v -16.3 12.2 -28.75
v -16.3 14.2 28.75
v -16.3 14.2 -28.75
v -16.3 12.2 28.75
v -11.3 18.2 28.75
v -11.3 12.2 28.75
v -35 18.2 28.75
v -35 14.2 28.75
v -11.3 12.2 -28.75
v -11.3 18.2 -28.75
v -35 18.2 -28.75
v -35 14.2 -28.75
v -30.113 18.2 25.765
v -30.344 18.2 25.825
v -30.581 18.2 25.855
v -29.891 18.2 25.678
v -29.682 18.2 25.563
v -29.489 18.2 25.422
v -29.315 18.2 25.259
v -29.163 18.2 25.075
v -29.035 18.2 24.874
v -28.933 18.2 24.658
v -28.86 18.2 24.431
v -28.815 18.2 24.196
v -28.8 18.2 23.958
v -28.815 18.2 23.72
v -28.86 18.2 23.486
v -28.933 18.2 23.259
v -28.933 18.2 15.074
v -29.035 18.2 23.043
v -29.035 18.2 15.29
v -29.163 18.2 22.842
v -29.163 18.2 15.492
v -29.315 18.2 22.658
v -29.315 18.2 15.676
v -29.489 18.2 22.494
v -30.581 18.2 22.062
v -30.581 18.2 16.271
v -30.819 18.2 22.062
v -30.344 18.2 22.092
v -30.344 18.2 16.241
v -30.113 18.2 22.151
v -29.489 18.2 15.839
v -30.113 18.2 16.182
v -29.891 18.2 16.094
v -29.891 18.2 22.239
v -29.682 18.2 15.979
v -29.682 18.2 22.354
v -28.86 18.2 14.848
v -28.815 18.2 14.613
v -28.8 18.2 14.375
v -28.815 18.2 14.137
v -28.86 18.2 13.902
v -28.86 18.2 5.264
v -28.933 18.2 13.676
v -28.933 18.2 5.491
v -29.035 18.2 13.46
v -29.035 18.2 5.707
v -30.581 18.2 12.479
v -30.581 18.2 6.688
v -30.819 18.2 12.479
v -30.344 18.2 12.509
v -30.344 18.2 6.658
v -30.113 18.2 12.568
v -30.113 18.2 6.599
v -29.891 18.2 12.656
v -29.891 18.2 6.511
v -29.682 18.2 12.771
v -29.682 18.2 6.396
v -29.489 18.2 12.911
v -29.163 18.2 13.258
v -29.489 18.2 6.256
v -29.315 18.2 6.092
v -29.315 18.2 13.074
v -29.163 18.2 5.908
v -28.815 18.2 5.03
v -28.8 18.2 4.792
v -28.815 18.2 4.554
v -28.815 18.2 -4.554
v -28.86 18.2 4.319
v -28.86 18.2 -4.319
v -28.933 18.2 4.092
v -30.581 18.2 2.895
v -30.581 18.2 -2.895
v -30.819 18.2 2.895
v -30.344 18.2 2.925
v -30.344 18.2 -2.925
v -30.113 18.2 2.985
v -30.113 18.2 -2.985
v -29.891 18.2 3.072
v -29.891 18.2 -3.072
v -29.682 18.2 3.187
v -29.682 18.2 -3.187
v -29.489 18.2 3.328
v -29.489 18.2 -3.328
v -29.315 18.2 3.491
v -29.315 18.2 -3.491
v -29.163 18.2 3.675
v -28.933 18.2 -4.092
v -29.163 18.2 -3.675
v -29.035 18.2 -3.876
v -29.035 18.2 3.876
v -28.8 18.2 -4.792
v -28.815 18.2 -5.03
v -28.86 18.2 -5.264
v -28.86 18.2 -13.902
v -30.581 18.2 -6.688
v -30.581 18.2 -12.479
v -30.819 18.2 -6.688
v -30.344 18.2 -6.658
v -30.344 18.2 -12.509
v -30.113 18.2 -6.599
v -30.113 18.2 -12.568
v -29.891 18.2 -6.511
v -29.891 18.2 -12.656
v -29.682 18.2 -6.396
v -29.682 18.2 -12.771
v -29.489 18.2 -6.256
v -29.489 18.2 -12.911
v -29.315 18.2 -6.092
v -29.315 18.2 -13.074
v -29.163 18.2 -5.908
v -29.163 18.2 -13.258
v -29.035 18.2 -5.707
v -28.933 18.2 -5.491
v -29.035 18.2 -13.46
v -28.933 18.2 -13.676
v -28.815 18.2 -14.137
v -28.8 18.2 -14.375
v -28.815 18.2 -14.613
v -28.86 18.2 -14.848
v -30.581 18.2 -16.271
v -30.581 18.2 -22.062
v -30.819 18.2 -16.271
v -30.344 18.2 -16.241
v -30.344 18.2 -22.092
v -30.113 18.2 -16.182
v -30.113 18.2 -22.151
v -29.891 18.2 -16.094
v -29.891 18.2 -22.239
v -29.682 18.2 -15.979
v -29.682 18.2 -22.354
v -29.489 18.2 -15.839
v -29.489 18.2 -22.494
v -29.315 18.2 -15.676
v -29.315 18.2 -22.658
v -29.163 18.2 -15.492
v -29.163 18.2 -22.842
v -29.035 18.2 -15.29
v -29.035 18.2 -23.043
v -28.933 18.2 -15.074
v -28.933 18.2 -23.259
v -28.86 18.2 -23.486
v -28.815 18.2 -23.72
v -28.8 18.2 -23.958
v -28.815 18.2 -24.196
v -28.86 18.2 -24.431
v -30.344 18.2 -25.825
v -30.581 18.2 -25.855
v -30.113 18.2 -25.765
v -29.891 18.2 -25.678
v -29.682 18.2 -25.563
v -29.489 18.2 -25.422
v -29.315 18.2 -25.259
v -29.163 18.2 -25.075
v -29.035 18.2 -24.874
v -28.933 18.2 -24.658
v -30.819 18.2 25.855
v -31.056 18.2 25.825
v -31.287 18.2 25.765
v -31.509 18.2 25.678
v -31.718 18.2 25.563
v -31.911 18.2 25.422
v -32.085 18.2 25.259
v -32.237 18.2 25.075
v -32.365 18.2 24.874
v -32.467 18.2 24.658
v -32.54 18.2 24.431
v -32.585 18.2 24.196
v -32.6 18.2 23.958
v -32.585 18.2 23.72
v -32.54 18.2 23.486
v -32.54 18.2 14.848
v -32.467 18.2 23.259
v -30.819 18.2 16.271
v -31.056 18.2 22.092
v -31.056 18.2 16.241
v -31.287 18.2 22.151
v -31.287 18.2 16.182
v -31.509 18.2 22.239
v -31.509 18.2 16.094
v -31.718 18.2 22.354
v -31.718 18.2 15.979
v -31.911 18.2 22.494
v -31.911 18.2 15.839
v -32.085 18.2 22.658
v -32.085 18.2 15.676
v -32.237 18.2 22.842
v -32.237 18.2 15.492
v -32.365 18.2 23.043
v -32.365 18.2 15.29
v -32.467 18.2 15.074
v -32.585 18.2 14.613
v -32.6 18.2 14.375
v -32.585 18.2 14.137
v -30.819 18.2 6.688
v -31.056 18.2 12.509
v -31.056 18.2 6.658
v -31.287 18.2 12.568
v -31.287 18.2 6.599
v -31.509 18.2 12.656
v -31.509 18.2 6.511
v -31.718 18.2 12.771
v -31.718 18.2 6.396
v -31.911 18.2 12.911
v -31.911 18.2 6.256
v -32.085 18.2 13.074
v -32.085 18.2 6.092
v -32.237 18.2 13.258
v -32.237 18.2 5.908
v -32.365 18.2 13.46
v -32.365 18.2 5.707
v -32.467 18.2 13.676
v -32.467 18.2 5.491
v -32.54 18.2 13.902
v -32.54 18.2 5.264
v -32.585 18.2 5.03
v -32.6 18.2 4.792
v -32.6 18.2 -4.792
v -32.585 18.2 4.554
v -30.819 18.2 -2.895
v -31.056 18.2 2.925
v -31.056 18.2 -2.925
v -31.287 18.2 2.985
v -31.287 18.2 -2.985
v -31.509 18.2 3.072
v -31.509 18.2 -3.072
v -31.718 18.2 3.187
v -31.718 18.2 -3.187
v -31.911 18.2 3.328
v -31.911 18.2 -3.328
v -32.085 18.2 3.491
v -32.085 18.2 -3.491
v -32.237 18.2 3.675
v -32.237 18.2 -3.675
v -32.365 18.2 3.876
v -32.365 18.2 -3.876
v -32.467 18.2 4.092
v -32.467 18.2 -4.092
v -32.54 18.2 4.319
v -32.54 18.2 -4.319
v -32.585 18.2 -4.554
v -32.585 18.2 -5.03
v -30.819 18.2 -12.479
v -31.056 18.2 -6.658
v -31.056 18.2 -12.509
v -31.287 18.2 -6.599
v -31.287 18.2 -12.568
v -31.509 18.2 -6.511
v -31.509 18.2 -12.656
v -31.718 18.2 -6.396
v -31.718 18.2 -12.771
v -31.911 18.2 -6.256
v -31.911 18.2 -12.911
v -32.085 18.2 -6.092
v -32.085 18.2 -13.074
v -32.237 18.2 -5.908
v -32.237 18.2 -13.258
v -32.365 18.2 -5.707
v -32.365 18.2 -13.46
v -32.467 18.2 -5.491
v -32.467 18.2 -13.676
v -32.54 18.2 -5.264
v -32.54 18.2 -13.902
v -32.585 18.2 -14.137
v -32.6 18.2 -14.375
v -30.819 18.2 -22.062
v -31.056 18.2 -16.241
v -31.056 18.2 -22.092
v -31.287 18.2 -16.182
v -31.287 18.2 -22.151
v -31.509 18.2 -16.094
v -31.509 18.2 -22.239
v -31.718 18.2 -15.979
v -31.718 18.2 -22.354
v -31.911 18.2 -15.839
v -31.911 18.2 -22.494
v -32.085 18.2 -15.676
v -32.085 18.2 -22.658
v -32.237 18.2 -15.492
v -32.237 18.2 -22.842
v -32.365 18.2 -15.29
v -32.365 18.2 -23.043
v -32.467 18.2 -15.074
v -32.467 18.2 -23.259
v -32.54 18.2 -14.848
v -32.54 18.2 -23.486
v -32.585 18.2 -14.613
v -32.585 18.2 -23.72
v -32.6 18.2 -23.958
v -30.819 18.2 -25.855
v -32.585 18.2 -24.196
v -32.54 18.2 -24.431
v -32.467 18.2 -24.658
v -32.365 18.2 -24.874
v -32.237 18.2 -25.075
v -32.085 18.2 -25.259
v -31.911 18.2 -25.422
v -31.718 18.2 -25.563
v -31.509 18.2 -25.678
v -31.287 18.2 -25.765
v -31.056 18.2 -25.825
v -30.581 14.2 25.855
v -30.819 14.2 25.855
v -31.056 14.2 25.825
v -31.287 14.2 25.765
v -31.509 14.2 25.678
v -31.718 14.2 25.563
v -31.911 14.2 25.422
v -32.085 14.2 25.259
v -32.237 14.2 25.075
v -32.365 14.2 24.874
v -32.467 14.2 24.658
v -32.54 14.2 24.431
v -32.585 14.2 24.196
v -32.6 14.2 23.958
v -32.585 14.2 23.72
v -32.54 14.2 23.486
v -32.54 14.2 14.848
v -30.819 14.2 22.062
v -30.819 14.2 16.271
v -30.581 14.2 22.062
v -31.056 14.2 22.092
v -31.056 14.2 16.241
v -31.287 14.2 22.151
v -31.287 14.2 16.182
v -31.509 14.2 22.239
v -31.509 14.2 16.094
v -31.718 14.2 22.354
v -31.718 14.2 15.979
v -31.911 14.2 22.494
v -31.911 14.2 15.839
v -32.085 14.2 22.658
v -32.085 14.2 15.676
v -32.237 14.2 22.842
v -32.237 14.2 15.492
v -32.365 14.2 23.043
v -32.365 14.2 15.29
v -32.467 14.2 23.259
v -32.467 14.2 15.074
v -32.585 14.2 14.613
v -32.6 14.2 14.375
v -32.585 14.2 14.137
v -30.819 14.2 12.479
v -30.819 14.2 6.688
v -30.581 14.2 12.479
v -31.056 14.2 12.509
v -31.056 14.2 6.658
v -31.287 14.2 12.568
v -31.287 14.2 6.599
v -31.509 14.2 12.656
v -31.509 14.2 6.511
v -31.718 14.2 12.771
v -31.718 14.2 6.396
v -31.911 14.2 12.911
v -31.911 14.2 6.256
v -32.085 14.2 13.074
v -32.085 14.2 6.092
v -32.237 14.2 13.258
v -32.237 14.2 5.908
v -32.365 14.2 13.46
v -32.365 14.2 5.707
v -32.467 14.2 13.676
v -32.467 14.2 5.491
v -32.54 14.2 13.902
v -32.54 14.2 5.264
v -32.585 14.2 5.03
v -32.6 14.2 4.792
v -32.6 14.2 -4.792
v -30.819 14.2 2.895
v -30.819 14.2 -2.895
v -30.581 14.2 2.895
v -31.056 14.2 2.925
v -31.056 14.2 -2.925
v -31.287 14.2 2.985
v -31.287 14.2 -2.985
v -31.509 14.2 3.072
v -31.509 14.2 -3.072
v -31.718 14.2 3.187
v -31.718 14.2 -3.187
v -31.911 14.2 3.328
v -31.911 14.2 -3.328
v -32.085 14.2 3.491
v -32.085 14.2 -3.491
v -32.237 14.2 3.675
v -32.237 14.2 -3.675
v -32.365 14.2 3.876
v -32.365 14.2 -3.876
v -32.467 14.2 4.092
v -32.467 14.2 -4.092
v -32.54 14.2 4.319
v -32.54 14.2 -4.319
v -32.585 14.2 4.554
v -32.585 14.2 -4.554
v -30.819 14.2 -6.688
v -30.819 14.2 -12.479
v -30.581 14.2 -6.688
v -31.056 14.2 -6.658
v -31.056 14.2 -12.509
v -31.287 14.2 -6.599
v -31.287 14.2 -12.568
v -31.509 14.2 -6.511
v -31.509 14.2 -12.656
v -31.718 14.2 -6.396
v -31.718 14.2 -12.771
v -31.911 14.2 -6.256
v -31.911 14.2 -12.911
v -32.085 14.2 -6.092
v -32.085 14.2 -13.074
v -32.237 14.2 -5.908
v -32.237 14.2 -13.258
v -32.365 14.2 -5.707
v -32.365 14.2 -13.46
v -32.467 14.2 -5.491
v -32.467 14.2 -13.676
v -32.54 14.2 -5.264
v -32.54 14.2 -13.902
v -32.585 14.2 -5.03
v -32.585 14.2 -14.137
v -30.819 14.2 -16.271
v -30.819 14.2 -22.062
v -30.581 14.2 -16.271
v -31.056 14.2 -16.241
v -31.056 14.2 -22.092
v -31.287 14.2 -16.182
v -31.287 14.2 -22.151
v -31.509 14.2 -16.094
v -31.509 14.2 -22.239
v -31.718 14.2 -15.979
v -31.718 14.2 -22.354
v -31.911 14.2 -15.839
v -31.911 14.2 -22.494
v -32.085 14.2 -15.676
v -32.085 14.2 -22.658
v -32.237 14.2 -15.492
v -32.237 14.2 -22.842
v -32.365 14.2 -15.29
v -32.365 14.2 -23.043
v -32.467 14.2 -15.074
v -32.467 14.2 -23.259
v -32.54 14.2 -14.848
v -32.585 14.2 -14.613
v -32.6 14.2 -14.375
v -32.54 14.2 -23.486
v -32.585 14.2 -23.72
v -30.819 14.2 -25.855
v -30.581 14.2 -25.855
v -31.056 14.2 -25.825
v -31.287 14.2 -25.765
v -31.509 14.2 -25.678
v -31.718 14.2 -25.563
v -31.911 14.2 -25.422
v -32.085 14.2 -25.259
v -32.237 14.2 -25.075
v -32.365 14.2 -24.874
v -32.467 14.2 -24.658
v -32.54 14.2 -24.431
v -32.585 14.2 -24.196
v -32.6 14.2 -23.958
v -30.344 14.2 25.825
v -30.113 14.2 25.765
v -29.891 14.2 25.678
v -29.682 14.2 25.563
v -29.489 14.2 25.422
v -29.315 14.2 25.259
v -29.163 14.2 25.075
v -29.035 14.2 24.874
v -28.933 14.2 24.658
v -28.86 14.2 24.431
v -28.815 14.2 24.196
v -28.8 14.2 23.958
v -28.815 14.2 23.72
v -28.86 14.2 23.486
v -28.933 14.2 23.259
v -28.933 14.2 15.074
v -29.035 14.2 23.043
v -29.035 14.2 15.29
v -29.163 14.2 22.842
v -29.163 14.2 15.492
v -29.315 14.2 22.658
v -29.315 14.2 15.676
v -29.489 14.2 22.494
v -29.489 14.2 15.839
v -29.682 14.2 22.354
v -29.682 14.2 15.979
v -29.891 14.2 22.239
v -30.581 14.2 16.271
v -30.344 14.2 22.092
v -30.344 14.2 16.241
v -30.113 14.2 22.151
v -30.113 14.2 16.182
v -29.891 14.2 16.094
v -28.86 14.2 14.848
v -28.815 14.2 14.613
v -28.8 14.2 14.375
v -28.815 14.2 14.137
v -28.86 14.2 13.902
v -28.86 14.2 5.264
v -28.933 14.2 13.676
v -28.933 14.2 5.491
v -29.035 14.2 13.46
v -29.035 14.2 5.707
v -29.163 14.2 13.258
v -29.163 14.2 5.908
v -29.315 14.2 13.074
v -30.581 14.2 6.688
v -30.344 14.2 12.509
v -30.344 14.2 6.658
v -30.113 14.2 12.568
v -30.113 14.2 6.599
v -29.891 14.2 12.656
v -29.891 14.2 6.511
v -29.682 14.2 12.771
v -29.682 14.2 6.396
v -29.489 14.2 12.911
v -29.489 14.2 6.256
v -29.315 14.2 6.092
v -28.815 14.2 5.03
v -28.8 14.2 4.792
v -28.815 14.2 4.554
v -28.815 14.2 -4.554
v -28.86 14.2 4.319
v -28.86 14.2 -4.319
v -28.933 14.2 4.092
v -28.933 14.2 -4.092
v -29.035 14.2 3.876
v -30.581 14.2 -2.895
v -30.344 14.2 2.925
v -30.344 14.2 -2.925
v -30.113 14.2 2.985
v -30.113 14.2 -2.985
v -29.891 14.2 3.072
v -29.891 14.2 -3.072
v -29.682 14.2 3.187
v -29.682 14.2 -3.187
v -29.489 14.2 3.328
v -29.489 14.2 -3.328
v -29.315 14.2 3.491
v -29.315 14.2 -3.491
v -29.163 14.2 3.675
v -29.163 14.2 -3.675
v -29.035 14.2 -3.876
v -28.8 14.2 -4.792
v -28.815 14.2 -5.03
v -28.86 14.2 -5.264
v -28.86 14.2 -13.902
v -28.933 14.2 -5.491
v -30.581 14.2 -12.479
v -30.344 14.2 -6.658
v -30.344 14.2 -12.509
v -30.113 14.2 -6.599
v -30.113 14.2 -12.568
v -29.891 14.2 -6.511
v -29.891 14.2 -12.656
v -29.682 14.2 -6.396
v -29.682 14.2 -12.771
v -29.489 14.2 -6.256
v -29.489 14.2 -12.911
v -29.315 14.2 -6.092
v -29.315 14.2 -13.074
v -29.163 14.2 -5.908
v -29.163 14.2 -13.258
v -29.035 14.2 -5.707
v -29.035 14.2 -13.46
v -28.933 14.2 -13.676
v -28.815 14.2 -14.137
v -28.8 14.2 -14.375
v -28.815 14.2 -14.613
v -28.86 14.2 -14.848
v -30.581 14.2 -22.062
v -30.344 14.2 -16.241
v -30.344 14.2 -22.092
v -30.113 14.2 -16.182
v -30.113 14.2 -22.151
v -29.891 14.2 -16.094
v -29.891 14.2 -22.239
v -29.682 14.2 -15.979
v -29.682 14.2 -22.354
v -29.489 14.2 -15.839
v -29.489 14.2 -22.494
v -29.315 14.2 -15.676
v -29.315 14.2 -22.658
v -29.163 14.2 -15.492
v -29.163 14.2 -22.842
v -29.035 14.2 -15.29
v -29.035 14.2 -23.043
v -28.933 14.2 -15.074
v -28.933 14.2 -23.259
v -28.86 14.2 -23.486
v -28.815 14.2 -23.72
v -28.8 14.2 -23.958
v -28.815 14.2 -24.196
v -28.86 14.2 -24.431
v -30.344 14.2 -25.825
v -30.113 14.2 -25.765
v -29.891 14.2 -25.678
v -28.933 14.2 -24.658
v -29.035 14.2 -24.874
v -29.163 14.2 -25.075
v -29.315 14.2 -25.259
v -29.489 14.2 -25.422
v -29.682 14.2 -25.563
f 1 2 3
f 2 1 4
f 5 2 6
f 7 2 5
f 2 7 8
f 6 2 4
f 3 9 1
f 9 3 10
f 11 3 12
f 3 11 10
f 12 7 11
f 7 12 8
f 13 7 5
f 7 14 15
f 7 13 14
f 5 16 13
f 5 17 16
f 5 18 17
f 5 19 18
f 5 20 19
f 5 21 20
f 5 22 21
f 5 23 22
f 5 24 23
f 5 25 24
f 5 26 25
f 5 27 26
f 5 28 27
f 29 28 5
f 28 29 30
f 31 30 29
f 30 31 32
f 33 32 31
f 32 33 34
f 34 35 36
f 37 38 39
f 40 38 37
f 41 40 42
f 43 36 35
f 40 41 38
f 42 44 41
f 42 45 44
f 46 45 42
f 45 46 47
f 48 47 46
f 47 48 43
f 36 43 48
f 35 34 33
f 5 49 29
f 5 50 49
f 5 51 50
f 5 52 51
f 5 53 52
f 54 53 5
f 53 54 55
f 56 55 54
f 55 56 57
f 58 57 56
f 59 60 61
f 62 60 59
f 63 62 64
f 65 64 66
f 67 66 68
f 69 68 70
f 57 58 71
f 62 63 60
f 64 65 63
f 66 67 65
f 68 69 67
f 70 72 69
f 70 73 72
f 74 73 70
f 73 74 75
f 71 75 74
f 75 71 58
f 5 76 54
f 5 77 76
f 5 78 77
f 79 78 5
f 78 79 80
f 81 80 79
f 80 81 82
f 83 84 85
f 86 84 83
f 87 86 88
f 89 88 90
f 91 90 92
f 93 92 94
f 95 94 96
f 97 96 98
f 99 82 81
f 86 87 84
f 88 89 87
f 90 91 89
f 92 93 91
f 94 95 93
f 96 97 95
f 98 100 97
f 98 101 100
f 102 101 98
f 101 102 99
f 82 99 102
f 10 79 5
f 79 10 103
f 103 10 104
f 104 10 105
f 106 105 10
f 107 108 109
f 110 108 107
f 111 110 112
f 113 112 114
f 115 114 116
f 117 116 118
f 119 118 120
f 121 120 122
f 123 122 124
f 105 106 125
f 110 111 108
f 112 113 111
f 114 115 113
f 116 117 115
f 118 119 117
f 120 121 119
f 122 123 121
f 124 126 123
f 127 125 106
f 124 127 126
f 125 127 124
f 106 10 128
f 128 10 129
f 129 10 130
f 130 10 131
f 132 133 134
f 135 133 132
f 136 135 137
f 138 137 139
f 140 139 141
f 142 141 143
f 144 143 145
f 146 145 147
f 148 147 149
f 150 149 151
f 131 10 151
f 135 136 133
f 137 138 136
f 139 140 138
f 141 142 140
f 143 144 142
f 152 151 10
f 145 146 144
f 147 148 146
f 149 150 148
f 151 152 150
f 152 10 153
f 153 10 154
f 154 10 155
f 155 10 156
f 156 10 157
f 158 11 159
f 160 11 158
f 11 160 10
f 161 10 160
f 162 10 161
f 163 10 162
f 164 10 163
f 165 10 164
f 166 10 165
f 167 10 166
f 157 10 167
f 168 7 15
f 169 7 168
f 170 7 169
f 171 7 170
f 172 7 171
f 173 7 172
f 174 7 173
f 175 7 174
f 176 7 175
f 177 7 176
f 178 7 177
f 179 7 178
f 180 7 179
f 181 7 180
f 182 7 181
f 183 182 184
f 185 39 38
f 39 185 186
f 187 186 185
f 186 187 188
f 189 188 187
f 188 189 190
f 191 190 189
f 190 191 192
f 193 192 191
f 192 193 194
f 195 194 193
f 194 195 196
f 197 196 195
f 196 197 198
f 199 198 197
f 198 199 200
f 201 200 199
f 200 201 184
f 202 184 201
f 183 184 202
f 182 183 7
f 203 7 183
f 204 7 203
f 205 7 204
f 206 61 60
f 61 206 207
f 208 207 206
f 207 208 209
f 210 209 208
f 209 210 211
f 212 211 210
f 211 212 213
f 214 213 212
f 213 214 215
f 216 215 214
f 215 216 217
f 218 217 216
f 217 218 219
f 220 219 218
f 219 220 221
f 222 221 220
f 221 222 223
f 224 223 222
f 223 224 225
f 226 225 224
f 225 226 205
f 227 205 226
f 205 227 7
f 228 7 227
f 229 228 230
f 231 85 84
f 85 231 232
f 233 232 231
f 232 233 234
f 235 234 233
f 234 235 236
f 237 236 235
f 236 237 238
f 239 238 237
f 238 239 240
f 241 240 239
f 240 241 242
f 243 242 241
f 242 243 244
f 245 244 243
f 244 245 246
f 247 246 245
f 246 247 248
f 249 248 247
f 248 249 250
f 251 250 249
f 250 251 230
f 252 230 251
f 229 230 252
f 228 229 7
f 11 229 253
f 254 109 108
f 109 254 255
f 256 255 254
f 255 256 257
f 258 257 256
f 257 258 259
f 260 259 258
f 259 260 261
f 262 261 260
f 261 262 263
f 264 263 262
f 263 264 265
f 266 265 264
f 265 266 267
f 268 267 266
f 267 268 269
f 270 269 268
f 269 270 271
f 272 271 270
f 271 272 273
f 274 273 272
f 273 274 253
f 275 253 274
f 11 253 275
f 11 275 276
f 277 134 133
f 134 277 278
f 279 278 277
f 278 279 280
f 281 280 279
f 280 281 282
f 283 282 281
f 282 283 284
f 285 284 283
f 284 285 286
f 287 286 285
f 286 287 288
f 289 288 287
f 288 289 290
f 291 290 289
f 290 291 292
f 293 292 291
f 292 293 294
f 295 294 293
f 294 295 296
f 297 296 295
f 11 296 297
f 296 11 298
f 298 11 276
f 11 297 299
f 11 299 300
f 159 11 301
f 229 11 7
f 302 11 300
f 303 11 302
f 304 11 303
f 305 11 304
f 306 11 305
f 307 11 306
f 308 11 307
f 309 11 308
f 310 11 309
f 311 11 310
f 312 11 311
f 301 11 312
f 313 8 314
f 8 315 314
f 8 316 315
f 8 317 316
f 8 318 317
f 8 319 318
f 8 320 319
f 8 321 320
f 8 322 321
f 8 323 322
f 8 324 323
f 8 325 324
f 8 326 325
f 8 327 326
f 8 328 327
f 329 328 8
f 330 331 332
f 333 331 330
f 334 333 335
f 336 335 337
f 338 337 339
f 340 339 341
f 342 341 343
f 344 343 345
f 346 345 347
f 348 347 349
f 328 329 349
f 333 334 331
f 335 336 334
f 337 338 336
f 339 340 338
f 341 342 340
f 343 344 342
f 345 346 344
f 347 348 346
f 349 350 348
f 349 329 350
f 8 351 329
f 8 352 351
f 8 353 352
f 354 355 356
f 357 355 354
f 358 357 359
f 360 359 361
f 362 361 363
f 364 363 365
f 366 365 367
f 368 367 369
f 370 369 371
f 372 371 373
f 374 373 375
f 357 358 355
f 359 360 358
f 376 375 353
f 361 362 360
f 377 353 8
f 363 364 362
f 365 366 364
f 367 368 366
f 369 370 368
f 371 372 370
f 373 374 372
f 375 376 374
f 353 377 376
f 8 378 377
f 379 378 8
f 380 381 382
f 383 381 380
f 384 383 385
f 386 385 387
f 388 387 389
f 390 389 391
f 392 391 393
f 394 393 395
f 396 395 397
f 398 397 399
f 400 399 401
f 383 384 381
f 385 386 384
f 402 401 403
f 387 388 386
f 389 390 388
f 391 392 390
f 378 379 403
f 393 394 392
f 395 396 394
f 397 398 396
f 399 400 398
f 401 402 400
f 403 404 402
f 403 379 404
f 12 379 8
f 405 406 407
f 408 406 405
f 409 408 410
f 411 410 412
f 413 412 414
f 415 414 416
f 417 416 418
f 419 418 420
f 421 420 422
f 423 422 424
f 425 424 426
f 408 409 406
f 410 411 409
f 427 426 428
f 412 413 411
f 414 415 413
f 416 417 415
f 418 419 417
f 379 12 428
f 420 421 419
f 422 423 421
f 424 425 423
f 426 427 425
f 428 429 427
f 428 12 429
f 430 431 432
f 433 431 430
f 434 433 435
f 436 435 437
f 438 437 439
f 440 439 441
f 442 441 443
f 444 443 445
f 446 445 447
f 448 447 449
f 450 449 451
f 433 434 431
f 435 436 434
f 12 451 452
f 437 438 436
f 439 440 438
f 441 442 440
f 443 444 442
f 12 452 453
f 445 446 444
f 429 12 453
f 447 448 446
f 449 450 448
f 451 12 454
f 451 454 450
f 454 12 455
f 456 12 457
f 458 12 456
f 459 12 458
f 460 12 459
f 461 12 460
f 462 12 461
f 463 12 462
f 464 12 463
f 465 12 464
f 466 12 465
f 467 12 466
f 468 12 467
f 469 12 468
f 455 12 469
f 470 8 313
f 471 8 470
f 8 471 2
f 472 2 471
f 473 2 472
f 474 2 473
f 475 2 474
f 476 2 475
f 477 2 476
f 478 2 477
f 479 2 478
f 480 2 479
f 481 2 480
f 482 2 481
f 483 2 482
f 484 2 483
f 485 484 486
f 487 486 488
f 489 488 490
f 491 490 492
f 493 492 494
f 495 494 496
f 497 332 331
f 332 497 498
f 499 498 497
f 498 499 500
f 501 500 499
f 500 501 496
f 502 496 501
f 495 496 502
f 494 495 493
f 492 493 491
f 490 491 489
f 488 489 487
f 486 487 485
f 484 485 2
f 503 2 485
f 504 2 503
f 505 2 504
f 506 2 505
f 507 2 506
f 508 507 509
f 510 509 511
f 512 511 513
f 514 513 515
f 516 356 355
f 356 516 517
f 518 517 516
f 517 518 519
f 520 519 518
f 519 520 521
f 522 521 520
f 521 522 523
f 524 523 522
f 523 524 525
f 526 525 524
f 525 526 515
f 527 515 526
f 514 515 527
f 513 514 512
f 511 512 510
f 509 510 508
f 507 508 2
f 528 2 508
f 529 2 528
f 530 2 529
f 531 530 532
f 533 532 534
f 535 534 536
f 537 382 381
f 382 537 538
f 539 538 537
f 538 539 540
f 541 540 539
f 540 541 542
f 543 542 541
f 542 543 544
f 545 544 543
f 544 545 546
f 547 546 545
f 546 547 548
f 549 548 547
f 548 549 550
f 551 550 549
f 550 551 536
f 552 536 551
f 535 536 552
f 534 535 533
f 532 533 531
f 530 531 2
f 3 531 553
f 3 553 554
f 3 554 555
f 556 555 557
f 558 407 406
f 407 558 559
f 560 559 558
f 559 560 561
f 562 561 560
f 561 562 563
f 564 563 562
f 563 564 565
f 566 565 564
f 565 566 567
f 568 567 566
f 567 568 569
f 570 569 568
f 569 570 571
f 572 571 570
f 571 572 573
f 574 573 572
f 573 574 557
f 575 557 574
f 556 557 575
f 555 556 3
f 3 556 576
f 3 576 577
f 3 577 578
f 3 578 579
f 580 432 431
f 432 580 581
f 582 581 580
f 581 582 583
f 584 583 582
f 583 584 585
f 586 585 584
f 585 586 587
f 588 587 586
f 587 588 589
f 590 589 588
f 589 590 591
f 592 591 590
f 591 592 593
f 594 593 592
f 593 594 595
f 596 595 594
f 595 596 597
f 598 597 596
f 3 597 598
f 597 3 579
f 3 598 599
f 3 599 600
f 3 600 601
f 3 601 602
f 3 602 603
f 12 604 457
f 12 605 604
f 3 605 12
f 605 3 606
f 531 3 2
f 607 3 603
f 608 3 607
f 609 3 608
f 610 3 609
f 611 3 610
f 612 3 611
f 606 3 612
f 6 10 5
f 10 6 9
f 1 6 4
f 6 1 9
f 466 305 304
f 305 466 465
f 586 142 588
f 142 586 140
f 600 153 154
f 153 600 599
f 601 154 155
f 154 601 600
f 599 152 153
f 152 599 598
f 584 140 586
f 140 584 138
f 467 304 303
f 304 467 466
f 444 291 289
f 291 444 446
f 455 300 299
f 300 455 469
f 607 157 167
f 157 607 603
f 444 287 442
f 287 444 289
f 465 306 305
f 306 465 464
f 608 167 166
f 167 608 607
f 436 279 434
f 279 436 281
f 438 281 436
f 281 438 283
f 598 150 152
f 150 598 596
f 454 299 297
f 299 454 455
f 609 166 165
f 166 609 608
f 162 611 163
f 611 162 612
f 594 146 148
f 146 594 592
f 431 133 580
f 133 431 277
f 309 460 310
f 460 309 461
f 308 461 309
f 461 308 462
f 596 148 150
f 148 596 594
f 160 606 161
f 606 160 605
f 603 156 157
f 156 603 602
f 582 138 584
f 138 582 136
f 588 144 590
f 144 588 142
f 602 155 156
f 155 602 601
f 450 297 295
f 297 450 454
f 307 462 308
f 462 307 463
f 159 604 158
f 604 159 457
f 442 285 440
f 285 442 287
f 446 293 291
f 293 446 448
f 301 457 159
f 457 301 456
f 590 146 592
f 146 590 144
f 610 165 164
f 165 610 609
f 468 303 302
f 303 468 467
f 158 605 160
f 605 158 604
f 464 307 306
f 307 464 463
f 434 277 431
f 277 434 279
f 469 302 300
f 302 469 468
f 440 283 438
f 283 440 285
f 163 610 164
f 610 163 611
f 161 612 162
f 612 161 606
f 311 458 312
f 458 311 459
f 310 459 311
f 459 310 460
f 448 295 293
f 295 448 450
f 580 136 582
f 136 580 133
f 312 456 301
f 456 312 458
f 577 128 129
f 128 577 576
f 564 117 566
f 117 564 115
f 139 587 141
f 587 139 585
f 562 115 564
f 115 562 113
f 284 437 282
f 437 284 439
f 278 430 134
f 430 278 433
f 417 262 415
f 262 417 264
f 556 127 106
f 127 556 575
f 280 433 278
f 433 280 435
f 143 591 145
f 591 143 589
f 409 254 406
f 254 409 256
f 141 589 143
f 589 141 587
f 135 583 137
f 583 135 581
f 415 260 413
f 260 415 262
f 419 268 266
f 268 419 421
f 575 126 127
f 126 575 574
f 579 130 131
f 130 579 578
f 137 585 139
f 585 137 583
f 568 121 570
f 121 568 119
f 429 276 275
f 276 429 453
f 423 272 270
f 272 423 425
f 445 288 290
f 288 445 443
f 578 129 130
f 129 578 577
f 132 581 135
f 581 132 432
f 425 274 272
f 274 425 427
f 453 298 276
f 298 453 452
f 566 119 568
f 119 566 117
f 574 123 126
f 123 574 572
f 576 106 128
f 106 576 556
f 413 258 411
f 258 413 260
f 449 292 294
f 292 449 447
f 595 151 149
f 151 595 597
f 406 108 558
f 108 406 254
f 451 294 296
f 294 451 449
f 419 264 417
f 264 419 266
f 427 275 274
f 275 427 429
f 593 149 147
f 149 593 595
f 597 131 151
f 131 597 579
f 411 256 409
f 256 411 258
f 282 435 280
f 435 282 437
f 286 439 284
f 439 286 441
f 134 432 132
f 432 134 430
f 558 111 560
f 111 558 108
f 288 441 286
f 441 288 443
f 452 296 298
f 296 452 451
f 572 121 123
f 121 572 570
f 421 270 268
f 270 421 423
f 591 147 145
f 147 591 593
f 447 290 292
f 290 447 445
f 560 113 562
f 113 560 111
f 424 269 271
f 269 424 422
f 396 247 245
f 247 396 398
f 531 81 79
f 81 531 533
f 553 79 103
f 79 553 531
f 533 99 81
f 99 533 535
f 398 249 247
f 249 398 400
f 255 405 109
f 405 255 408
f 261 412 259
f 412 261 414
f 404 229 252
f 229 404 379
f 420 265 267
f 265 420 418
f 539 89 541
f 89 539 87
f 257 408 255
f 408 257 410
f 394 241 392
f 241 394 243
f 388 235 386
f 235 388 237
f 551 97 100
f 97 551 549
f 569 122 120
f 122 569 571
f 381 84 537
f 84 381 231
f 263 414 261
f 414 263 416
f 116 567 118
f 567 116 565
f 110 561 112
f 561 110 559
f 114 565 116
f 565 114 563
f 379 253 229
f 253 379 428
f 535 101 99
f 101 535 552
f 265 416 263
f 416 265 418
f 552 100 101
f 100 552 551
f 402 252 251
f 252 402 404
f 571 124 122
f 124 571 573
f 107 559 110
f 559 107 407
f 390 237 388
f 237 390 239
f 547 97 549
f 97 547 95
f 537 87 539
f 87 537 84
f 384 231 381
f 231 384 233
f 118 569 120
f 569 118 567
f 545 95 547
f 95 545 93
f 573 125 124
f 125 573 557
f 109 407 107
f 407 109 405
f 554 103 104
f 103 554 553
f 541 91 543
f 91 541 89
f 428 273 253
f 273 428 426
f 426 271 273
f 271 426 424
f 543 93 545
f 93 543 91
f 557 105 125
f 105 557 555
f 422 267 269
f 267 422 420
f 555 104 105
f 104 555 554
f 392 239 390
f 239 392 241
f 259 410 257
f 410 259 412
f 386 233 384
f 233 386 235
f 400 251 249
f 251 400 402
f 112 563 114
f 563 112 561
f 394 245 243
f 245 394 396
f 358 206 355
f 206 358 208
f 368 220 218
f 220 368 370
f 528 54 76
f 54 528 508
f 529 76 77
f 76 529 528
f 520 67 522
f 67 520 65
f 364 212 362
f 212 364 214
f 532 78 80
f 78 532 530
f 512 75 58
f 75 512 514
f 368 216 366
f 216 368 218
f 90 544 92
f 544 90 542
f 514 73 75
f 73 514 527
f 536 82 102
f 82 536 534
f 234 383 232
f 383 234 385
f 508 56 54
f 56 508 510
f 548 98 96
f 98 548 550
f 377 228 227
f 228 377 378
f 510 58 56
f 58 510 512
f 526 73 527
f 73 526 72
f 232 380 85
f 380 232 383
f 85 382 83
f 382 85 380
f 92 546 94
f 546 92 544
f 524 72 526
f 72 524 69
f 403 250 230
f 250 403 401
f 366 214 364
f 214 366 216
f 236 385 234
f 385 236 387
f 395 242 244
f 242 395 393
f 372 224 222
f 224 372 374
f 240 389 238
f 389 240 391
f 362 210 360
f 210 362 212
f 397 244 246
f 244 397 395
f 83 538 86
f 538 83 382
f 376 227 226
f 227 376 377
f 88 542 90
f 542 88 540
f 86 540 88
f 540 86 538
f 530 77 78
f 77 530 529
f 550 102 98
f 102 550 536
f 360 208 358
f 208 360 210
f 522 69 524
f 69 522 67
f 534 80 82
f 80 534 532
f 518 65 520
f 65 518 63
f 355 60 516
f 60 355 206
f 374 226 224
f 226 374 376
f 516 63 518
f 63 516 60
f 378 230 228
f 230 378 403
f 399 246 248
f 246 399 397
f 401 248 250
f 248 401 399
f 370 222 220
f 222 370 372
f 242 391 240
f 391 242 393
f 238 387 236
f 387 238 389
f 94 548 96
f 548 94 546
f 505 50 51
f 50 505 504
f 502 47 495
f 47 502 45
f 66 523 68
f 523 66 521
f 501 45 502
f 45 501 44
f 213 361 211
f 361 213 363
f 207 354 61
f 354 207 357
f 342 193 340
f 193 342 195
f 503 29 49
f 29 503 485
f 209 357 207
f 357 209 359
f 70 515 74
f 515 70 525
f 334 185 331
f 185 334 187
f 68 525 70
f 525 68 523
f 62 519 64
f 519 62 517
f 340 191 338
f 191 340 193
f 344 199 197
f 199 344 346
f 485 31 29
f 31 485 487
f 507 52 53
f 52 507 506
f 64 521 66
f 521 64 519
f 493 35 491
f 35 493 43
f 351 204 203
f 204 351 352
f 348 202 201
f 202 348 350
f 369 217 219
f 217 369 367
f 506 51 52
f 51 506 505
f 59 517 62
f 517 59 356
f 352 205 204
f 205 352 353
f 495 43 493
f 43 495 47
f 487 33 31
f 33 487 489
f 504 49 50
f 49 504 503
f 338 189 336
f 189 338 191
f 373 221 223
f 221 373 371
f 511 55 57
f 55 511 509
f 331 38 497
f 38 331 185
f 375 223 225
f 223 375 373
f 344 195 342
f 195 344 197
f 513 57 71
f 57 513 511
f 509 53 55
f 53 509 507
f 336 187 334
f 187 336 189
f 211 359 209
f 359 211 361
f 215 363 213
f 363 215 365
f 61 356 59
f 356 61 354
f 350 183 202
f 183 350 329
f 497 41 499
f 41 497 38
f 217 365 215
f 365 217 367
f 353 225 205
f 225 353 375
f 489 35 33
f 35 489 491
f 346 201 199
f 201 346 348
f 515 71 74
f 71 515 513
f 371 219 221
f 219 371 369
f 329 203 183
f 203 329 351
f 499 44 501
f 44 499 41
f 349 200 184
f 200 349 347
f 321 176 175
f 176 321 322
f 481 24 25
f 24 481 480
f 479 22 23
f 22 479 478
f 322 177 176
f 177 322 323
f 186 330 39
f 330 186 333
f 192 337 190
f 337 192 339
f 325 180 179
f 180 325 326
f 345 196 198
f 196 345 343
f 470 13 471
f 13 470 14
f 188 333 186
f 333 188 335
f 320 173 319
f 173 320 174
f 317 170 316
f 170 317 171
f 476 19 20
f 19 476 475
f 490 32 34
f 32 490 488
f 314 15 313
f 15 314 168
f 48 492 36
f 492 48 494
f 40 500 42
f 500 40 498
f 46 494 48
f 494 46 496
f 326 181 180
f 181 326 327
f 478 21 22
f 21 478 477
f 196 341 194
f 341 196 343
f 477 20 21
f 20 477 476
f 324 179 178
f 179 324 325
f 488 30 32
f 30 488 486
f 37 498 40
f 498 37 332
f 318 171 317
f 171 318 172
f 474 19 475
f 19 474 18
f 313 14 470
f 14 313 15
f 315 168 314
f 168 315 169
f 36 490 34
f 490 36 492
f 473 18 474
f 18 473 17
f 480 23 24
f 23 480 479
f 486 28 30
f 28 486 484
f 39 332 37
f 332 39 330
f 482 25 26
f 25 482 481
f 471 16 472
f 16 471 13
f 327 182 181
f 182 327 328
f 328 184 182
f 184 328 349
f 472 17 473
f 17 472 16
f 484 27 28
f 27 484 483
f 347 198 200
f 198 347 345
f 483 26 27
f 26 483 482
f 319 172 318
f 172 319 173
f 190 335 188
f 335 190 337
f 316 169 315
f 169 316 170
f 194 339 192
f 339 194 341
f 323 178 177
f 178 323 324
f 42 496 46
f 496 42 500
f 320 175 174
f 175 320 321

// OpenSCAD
use <MCAD/regular_shapes.scad>
use <../../lib/Getriebe.scad>

$fn = 50;
pusher_dist = 22;
pusher_move = 20;
remover_move = 15;
//pusher_height = pusher_move + remover_move + 20;
pusher_height = 10;
pusher_width = 6;
gear_d = 13.5;

stepper_hole_dist = 49.5;
stepper_body_d = 42;
hole_d = 3;
hole_d_through = 3.8;
bar_width = 8;
bar_side_width = 20;
bar_thick = 4.2;

bar_length = 2*bar_side_width+30;
bar_side_length = bar_width+stepper_hole_dist;
bar_side_side_width = bar_side_width-11.4;
bar_side_side_thick = bar_thick + pusher_height;

module pusher_frame() {
	f_size = bar_side_length;
	//f_size = 10;
	difference() {
		union() {
			translate([-bar_length/2, pusher_height+bar_thick, -bar_side_length/2]) {
				cube([bar_side_side_width+10.1, 4, f_size]);
				translate([bar_side_side_width+10.1, -2, 0]) {
					cube([5, pusher_width, f_size]);
				} 
			}
		}
		side_holes();
	}
}

module pusher() {
	p_size = bar_side_length + 50;
	//p_size = 10;
	difference() {
//	union() {
		union() {
			translate([-pusher_width/2+9.6, 10.2, 1]) {
				rotate([0, -90, 90]) {
					zahnstange(modul=0.9, laenge=p_size, hoehe=19.7, breite=pusher_width, eingriffswinkel=25, schraegungswinkel=0); 
				}
			}
			translate([16.4, bar_thick, -p_size/2]) {
				cube([10, pusher_height-0.4, p_size]);
			}
		}
		translate([16.4+5, bar_thick+pusher_height/2, -p_size/2-5]) {
			cylinder(d=hole_d, h=p_size+10);
		}
	}
}

module stepper_frame() {
	difference() {
//	union() {
		translate([-bar_length/2, 0, -bar_side_length/2]) {
			union() {
				// top bottom bars
				for(z=[0,1]) {
					translate([0, 0, z*stepper_hole_dist]) {
						cube([bar_length, bar_thick, bar_width]);
					}
				}
				// left right bars
				for(x=[0,1]) {
						union() {
							translate([x*(bar_length-bar_side_width), 0, 0]) {
								cube([bar_side_width, bar_thick, bar_side_length]);
							}
							translate([x*(bar_length-bar_side_side_width), 0, 0]) {
								cube([bar_side_side_width, bar_side_side_thick, bar_side_length]);
							}
						}
				}
			}
		}
		side_holes();
		translate([0, 50, -stepper_hole_dist/2]) {
			for(z=[0,1]) {
				translate([0, 0, z*stepper_hole_dist]) {
					rotate([90, 0, 0]) {
						cylinder(d=hole_d_through, h=100);
					}
				}
			}
		}
	}
}

module side_holes() {
	translate([-bar_length/2, 0, -bar_side_length/2]) {
		for(x=[0,1]) {
			n_holes = 5;
			h_step = bar_side_length / (n_holes + 1);
			translate([x*(bar_length-bar_side_side_width), 0, h_step/2]) {
				for(z=[0:1:n_holes]) {
					translate([bar_side_side_width/2, 50, z*h_step]) {
						rotate([90, 0, 0]) {
							cylinder(d=hole_d_through, h=100);
						}
					}
				}
			}
		}
	}
}

module stepper_mockup() {
	translate([0, -15, 0]) {
		rotate([-90, 0, 0]) {
			cylinder(d=stepper_body_d, h=15);
			cylinder(d=gear_d, h=25);
		}
	}
}

pusher_frame();
rotate([0, 180, 0]) {
	%pusher_frame();
}
%pusher();
//color("blue")
	rotate([0, 180, 0]) {
%		pusher();
	}


%stepper_frame();
%stepper_mockup();
